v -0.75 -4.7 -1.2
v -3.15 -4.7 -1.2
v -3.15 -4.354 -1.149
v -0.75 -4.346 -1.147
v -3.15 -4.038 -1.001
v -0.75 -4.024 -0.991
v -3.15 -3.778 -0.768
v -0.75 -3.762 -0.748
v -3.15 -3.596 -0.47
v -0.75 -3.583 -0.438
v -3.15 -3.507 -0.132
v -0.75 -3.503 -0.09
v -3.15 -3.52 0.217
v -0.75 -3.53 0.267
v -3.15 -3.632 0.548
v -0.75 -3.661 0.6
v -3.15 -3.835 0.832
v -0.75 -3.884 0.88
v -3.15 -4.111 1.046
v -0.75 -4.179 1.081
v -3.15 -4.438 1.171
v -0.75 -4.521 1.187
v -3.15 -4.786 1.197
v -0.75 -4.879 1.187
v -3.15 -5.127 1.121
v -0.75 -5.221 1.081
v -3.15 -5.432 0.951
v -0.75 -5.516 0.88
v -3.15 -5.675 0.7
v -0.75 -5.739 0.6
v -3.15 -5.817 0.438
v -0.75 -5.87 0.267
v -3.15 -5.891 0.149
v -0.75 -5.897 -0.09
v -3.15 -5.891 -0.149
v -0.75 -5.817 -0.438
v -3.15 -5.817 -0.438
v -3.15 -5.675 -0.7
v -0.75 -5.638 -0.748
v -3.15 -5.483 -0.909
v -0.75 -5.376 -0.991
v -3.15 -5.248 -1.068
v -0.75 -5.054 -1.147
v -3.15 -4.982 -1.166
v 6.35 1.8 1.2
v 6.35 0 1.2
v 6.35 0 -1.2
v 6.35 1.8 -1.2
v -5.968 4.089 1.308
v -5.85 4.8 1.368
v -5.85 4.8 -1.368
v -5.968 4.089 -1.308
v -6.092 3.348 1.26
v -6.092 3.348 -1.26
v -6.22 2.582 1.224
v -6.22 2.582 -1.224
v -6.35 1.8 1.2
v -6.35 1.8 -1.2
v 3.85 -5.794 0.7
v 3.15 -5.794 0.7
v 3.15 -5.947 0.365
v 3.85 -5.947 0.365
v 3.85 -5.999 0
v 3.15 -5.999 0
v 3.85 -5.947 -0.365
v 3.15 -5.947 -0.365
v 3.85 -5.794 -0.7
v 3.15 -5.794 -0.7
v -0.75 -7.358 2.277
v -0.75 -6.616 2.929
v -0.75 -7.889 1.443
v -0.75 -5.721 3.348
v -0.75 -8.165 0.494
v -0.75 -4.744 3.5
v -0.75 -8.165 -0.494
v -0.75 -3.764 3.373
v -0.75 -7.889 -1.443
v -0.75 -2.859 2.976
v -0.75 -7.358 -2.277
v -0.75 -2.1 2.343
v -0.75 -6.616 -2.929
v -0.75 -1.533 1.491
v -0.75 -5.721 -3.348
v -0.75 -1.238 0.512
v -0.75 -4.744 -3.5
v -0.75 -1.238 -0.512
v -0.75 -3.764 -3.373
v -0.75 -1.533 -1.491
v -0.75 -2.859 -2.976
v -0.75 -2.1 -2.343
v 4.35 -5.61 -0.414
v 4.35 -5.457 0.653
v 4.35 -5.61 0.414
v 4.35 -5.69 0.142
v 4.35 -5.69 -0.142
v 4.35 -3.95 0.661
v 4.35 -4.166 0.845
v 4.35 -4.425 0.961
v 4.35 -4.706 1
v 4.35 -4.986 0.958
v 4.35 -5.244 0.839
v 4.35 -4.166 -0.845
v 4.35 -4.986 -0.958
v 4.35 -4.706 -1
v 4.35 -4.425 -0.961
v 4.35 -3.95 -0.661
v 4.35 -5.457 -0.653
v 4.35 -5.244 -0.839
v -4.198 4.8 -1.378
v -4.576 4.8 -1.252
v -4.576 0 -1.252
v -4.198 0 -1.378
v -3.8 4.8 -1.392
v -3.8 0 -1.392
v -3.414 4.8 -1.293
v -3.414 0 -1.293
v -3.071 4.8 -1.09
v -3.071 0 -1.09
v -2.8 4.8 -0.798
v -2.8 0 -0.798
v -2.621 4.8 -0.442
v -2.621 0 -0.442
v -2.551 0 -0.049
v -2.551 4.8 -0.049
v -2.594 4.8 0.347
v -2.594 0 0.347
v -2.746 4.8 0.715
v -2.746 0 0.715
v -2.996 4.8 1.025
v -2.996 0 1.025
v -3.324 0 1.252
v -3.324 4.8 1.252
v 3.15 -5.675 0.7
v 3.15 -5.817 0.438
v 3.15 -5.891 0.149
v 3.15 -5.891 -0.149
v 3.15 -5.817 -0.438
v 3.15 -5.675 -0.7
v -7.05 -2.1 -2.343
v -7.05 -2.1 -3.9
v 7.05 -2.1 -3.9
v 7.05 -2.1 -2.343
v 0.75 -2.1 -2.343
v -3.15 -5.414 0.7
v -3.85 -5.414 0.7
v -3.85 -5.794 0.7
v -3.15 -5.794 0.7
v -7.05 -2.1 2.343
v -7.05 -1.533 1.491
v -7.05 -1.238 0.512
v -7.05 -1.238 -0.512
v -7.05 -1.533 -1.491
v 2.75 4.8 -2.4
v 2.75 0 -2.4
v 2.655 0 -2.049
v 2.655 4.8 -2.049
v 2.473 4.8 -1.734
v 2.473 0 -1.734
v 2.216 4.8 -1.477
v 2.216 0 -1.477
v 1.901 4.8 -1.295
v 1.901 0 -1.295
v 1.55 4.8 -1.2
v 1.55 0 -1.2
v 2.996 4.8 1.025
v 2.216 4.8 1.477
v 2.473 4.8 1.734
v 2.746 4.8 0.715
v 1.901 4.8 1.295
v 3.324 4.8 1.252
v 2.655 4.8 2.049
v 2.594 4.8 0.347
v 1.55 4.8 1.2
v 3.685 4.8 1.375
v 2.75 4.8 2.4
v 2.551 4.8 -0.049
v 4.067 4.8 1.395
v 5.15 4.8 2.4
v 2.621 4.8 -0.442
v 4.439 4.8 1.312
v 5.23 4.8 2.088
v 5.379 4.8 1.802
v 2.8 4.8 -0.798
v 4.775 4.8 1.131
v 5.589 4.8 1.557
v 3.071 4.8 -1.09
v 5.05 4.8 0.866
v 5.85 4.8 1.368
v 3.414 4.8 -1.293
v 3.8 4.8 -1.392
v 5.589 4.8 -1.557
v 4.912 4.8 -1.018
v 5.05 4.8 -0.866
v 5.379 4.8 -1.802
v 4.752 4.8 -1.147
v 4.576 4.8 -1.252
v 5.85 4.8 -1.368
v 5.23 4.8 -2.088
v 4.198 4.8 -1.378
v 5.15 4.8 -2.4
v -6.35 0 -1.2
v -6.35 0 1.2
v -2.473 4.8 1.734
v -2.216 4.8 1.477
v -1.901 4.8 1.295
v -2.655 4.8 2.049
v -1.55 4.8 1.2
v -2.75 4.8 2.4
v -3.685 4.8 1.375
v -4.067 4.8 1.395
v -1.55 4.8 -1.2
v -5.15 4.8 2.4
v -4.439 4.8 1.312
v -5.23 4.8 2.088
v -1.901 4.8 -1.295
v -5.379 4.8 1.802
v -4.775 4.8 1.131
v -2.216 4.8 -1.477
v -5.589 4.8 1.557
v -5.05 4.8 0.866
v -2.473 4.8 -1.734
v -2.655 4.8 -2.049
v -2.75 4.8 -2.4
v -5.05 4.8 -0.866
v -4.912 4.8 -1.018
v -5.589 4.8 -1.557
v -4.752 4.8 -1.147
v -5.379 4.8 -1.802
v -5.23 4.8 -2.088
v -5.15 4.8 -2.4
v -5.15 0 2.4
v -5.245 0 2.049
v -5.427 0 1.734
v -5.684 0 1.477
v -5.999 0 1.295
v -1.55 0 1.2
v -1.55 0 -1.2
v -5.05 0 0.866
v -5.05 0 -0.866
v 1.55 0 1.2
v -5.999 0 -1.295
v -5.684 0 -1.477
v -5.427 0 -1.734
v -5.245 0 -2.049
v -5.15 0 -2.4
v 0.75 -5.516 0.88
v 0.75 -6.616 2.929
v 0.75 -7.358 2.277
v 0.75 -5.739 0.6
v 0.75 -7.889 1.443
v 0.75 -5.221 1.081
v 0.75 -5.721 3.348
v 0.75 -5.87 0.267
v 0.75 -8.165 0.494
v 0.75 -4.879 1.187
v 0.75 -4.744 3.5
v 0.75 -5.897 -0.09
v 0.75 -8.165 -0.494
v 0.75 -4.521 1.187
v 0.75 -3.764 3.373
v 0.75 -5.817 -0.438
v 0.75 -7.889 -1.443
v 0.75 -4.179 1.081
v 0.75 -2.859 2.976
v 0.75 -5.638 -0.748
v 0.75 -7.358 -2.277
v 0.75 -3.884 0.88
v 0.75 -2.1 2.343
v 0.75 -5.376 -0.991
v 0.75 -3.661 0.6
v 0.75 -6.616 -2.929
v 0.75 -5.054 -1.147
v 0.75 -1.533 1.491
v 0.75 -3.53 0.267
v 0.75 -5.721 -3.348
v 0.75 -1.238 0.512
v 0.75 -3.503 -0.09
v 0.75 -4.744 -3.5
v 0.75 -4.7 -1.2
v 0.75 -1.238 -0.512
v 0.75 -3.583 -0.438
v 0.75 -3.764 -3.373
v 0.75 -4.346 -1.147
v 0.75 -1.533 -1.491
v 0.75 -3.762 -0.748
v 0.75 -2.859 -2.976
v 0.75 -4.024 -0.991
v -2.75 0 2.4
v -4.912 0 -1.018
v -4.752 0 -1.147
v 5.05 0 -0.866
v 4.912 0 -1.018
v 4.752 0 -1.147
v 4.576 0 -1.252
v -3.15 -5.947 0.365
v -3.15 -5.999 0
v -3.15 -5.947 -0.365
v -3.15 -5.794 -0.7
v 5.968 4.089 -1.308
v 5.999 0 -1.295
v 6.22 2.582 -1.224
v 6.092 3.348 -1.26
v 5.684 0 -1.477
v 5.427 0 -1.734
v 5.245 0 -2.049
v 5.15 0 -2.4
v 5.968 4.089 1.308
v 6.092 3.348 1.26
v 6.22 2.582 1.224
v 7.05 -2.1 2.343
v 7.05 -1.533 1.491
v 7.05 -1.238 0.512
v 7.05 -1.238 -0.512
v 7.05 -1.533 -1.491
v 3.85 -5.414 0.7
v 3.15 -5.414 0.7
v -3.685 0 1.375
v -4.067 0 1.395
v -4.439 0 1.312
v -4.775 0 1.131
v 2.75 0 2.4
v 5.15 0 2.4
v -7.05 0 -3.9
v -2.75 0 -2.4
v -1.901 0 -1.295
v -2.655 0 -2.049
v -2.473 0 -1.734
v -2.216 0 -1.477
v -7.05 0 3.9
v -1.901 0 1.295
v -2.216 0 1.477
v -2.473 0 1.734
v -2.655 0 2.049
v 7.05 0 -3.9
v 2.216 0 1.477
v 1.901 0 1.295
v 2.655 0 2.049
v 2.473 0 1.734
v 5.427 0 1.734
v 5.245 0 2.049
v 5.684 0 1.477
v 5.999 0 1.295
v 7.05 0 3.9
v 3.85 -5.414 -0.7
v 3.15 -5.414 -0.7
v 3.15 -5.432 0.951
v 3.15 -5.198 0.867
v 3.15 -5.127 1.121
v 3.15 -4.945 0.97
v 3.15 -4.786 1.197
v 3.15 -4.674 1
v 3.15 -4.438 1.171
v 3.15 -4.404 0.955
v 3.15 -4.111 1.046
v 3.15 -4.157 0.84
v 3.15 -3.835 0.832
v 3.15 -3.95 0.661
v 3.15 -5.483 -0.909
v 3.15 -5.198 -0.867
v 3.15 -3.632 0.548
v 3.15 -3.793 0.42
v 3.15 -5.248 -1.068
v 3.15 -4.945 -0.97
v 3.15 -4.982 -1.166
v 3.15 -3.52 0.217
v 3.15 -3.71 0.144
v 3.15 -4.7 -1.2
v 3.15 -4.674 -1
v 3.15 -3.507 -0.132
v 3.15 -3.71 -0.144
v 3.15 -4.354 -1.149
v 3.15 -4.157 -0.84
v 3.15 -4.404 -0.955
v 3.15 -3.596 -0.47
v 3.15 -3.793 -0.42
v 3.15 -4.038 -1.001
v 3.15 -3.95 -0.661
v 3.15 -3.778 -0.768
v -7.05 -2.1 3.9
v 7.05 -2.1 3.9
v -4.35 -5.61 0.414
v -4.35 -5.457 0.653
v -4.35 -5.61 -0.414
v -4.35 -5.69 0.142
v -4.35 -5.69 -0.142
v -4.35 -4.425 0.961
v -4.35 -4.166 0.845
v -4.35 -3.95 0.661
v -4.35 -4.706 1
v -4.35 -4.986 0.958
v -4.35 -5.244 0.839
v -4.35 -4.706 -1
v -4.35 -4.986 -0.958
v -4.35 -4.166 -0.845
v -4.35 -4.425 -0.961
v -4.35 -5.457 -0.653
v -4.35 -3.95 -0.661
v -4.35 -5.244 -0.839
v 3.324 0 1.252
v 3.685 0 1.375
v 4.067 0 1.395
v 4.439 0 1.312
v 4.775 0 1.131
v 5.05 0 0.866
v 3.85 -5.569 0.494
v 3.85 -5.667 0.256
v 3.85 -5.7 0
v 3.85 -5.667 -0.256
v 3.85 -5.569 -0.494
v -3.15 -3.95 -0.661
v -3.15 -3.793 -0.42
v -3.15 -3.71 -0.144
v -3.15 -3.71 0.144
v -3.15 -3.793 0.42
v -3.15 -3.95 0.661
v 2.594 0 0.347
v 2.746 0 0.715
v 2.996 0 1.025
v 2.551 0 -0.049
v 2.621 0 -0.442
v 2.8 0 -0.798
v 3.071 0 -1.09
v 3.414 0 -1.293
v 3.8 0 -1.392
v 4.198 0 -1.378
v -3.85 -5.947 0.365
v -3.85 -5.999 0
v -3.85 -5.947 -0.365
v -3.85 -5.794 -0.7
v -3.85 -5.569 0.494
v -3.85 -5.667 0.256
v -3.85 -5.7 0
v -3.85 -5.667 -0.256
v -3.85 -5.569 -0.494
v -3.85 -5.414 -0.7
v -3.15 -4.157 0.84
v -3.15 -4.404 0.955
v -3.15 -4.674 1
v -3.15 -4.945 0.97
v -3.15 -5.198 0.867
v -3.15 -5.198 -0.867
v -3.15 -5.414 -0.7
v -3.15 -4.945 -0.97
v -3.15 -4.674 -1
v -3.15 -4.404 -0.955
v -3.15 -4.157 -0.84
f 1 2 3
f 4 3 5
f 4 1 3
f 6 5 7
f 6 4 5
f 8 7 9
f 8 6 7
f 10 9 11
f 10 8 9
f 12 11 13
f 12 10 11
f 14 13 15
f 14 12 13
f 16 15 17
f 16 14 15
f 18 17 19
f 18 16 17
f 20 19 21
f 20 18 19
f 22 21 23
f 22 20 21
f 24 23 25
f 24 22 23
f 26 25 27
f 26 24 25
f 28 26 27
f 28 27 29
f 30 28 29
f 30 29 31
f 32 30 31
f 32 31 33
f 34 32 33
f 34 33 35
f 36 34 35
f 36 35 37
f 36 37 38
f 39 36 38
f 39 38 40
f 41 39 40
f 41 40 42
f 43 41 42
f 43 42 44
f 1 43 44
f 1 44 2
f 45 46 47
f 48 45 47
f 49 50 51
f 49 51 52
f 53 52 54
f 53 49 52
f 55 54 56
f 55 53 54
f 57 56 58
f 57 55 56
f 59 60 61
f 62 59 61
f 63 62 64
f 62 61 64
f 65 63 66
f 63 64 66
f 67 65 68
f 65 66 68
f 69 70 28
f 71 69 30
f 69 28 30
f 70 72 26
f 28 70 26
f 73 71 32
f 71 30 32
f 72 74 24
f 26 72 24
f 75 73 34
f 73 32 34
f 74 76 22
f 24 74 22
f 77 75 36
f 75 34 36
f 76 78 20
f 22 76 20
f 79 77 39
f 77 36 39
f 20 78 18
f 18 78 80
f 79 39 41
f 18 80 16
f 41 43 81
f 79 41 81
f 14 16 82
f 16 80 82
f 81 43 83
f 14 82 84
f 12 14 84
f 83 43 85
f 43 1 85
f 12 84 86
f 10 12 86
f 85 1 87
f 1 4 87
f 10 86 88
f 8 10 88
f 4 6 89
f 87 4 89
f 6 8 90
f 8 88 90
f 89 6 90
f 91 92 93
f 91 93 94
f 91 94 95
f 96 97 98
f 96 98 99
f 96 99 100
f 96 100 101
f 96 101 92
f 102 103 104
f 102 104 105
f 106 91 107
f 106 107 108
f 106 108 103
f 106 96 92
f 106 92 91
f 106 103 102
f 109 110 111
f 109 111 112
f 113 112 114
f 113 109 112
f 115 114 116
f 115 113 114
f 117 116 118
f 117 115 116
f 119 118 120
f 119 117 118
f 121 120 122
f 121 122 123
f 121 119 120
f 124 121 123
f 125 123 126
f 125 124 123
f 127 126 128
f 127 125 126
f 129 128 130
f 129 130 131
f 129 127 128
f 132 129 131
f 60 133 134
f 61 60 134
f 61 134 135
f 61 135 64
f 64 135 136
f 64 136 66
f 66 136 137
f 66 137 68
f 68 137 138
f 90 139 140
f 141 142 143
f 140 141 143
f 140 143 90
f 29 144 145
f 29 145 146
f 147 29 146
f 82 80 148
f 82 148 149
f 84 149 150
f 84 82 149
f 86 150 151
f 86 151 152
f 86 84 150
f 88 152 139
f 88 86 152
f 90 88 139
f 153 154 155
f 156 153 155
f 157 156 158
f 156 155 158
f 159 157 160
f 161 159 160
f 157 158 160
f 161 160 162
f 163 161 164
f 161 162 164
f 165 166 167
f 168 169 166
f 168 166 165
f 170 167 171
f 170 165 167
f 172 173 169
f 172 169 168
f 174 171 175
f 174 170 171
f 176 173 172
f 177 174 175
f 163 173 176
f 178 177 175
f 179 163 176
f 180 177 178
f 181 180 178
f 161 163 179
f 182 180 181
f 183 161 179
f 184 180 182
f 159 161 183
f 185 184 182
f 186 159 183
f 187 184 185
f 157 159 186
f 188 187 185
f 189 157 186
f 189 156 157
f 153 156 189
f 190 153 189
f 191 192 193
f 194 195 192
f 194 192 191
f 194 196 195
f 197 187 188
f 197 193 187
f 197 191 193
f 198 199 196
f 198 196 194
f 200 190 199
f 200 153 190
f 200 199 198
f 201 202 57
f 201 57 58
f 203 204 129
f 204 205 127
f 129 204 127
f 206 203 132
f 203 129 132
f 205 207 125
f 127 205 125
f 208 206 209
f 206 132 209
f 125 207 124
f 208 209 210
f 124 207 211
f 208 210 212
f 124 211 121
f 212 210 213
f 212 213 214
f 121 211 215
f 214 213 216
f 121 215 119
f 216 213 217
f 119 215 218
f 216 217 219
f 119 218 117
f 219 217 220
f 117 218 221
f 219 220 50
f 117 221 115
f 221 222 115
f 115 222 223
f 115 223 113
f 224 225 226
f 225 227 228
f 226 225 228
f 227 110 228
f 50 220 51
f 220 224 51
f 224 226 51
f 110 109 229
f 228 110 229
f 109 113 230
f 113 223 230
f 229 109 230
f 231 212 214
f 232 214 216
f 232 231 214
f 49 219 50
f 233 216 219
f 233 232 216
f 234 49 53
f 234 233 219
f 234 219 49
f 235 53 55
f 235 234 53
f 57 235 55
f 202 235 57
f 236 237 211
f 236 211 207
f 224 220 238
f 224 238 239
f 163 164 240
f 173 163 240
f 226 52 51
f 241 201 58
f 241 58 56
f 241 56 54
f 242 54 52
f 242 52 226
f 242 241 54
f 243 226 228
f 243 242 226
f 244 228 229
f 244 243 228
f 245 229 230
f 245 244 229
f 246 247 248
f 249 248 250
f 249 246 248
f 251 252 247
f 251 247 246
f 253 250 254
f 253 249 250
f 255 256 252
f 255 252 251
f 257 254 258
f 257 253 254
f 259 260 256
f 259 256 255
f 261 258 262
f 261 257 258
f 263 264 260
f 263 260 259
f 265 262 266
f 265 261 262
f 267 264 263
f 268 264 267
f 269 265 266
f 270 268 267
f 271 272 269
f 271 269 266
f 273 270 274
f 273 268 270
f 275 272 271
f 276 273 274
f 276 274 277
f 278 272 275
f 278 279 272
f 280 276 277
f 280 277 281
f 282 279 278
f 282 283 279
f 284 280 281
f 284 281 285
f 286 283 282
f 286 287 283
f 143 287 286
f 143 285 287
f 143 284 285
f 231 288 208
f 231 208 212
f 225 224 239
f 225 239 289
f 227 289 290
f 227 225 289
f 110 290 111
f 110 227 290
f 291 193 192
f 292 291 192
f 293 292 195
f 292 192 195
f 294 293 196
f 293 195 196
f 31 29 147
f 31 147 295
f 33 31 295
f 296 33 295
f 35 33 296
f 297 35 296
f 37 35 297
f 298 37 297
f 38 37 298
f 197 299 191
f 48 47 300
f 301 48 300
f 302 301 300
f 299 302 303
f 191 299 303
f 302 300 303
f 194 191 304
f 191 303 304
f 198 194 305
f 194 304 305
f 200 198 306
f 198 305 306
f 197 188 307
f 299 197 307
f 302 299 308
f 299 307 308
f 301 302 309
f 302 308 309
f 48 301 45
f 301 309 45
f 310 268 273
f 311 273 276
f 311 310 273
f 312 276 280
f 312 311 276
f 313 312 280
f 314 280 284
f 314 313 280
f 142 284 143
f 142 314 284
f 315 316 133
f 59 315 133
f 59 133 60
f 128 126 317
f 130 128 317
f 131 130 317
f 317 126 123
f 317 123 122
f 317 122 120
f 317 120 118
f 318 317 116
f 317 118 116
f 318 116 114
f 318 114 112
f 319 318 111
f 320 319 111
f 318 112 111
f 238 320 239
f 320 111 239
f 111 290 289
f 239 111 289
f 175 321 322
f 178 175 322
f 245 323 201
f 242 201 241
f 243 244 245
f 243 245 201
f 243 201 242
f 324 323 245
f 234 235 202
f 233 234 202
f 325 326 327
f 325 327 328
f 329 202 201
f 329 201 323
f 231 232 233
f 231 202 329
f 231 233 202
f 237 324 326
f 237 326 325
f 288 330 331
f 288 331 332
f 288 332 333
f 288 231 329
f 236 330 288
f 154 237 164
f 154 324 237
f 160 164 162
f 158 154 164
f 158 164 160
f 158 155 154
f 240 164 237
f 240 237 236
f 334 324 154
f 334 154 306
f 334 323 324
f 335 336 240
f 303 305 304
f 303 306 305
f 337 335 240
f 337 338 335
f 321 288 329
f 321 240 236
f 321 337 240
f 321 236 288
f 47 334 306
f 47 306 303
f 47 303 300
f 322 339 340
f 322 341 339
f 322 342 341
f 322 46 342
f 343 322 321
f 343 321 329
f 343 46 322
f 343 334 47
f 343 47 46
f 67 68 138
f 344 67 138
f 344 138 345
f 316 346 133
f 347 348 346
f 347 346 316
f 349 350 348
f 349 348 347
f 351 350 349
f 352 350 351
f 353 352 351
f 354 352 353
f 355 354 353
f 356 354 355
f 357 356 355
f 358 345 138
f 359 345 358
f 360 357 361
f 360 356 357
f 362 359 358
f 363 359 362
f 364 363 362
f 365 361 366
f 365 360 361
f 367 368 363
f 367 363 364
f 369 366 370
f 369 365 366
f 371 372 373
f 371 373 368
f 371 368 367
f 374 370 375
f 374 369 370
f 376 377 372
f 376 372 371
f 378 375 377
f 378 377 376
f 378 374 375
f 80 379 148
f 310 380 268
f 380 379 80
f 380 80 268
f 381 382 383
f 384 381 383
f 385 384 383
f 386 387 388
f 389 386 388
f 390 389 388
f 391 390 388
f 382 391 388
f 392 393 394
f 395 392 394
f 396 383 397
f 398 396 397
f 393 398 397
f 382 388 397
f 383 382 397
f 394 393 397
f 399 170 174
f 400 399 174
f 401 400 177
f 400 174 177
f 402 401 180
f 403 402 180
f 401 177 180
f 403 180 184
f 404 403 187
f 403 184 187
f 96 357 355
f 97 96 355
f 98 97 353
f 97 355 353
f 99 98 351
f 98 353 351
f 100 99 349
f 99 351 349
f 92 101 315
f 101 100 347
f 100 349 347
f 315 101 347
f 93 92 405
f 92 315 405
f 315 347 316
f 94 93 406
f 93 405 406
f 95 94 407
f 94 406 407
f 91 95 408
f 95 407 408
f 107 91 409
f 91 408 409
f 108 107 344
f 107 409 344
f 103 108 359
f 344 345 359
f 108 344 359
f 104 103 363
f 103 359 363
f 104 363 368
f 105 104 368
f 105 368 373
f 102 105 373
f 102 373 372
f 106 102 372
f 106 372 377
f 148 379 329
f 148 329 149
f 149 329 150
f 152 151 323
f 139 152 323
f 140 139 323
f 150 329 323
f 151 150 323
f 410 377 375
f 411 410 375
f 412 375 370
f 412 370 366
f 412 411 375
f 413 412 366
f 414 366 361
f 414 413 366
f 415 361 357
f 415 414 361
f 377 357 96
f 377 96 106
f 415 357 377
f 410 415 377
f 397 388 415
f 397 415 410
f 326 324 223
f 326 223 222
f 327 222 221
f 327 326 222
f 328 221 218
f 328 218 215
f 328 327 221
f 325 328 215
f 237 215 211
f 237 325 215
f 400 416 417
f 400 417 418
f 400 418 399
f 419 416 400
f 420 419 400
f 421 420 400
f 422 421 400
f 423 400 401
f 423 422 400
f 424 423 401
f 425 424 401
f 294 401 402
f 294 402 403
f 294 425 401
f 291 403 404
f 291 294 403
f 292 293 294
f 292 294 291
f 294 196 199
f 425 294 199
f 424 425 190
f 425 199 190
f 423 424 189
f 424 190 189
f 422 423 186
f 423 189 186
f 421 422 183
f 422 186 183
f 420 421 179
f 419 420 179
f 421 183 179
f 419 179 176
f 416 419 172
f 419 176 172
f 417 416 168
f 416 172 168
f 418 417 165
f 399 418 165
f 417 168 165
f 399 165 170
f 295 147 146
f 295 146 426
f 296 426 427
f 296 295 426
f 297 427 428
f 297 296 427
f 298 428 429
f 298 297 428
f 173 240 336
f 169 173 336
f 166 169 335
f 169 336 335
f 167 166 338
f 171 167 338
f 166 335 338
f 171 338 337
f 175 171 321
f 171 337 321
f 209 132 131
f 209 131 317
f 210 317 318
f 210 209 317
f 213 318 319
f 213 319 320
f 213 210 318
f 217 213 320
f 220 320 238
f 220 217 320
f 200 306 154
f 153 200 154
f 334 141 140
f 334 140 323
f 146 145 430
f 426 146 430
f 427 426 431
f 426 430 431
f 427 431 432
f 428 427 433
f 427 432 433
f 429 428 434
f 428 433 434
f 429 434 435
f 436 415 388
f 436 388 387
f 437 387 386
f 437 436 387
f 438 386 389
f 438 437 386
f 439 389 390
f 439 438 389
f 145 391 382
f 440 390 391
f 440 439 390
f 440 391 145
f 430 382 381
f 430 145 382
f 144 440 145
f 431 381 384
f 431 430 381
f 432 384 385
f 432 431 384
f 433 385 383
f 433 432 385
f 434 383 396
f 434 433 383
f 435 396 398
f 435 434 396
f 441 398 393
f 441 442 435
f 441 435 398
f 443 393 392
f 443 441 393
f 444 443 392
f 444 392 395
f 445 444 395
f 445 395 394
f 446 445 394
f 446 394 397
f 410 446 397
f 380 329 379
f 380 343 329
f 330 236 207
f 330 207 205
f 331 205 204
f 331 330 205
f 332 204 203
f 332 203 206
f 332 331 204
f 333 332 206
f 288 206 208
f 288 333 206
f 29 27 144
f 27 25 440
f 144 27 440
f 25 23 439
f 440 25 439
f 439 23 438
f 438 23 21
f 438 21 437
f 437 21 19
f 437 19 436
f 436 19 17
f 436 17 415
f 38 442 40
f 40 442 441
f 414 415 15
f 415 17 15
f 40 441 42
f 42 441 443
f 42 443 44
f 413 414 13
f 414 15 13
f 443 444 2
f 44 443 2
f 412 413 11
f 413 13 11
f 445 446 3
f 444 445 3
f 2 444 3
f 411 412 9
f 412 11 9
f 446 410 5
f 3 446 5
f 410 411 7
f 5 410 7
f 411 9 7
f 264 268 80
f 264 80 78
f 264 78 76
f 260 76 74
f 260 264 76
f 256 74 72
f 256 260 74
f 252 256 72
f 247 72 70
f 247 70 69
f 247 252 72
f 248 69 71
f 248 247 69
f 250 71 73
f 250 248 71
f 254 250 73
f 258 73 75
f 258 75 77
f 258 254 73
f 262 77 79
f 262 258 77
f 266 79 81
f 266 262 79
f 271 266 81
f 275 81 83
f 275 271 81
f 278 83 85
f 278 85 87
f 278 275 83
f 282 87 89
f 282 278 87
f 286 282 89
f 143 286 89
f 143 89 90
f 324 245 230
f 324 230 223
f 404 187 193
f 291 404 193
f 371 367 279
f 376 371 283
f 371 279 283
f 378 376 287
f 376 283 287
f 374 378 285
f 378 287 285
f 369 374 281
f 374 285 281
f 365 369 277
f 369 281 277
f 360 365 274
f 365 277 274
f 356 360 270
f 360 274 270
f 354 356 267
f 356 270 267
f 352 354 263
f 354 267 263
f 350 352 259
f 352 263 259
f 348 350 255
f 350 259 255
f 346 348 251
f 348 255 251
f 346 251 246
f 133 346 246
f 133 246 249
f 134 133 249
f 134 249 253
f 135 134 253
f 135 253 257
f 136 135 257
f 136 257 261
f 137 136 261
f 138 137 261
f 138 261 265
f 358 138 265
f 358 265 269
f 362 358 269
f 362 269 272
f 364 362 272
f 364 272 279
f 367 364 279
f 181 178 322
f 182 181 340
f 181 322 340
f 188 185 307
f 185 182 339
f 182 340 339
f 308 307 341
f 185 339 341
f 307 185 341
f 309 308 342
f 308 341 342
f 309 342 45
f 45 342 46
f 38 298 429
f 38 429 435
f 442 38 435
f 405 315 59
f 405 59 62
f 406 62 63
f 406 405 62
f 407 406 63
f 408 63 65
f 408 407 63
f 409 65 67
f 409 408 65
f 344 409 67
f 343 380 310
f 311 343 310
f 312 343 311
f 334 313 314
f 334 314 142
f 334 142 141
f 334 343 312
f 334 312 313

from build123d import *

# Parameters (mm, degrees)
SALIENTE_EXTRUIR1_DEPTH = 7.05
SALIENTE_EXTRUIR2_DEPTH = 0.75
CROQUIS2_R              = 1.2
SALIENTE_EXTRUIR3_DEPTH = 2.4
CROQUIS3_R              = 1
SALIENTE_EXTRUIR4_DEPTH = 1.2
CORTAR_EXTRUIR1_REACH   = 16.574
SALIENTE_EXTRUIR5_DEPTH = 0.7
SALIENTE_EXTRUIR6_DEPTH = 4.8
CORTAR_EXTRUIR2_DEPTH   = 4.8
CORTAR_EXTRUIR4_DEPTH   = 4.8


with BuildPart() as part:
    # Croquis1 → Saliente-Extruir1 (new, symmetric)
    with BuildSketch(Plane(origin=(0, 0, 0), x_dir=(0, 0, -1), z_dir=(1, 0, 0))):
        with BuildLine():
            ThreePointArc((-2.343074903, -2.1), (0, -1.2), (2.343074903, -2.1))
            Line((2.343074903, -2.1), (3.9, -2.1))
            Line((3.9, -2.1), (3.9, 0))
            Line((3.9, 0), (-3.9, 0))
            Line((-3.9, 0), (-3.9, -2.1))
            Line((-3.9, -2.1), (-2.343074903, -2.1))
        make_face()
    extrude(amount=SALIENTE_EXTRUIR1_DEPTH, both=True)

    # Croquis1<3> → Saliente-Extruir2 (add, symmetric)
    with BuildSketch(Plane(origin=(0, 0, 0), x_dir=(0, 0, -1), z_dir=(1, 0, 0))):
        with BuildLine():
            ThreePointArc((3.5, -4.7), (3.197714978, -3.277108957), (2.343074903, -2.1))
            ThreePointArc((2.343074903, -2.1), (0, -1.2), (-2.343074903, -2.1))
            ThreePointArc((-2.343074903, -2.1), (-1.422891043, -7.897714978), (3.5, -4.7))
        make_face()
    extrude(amount=SALIENTE_EXTRUIR2_DEPTH, both=True)

    # Croquis2 → Saliente-Extruir3 (add)
    with BuildSketch(Plane(origin=(0.75, 0, 0), x_dir=(0, 0, -1), z_dir=(1, 0, 0))):
        with Locations((0, -4.7)):
            Circle(CROQUIS2_R)
    saliente_extruir3 = extrude(amount=SALIENTE_EXTRUIR3_DEPTH)

    # Croquis3 → Saliente-Extruir4 (add)
    with BuildSketch(Plane(origin=(3.15, 0, 0), x_dir=(0, 0, -1), z_dir=(1, 0, 0))):
        with Locations((0, -4.7)):
            Circle(CROQUIS3_R)
    saliente_extruir4 = extrude(amount=SALIENTE_EXTRUIR4_DEPTH)

    # Croquis4 → Cortar-Extruir1 (cut, up to next)
    with BuildSketch(Plane(origin=(4.35, 0, 0), x_dir=(0, 0, -1), z_dir=(1, 0, 0)), mode=Mode.PRIVATE) as cortar_extruir1_sk1:
        with BuildLine():
            Line((-0.661437828, -3.95), (0.661437828, -3.95))
            ThreePointArc((0.661437828, -3.95), (0, -3.7), (-0.661437828, -3.95))
        make_face()
    cortar_extruir1_tool1 = extrude(cortar_extruir1_sk1.sketch, amount=-CORTAR_EXTRUIR1_REACH, mode=Mode.PRIVATE) & part.part
    cortar_extruir1 = cortar_extruir1_tool1.solids().sort_by_distance((4.35, -3.848845, 0))[0]
    add(cortar_extruir1, mode=Mode.SUBTRACT)

    # Croquis5 → Saliente-Extruir5 (add)
    with BuildSketch(Plane(origin=(3.15, 0, 0), x_dir=(0, 0, -1), z_dir=(1, 0, 0))):
        with BuildLine():
            ThreePointArc((0.7, -5.414142843), (0, -5.7), (-0.7, -5.414142843))
            Line((-0.7, -5.414142843), (-0.7, -5.794142843))
            ThreePointArc((-0.7, -5.794142843), (0, -5.99890283), (0.7, -5.794142843))
            Line((0.7, -5.794142843), (0.7, -5.414142843))
        make_face()
    saliente_extruir5 = extrude(amount=SALIENTE_EXTRUIR5_DEPTH)

    # Croquis6 → Saliente-Extruir6 (add)
    with BuildSketch(Plane(origin=(0, 0, 0), x_dir=(1, 0, 0), z_dir=(0, 1, 0))):
        with BuildLine():
            Line((2.75, -2.4), (5.15, -2.4))
            ThreePointArc((5.15, -2.4), (5.547451294, -1.597451294), (6.35, -1.2))
            Line((6.35, -1.2), (6.35, 1.2))
            ThreePointArc((6.35, 1.2), (5.547451294, 1.597451294), (5.15, 2.4))
            Line((5.15, 2.4), (2.75, 2.4))
            ThreePointArc((2.75, 2.4), (2.352548706, 1.597451294), (1.55, 1.2))
            Line((1.55, 1.2), (1.55, -1.2))
            ThreePointArc((1.55, -1.2), (2.352548706, -1.597451294), (2.75, -2.4))
        make_face()
    saliente_extruir6 = extrude(amount=SALIENTE_EXTRUIR6_DEPTH)

    # Croquis7 → Cortar-Extruir2 (cut)
    with BuildSketch(Plane(origin=(0, 4.8, 0), x_dir=(1, 0, 0), z_dir=(0, 1, 0))):
        with BuildLine():
            ThreePointArc((5.05, 0.866025404), (2.55, 0), (5.05, -0.866025404))
            Line((5.05, -0.866025404), (5.05, 0.866025404))
        make_face()
    cortar_extruir2 = extrude(amount=-CORTAR_EXTRUIR2_DEPTH, mode=Mode.SUBTRACT)

    # Croquis8 → Cortar-Extruir4 (cut)
    with BuildSketch(Plane.XY.offset(2.4)):
        Polygon((5.85, 4.8), (6.35, 1.8), (6.35, 4.8), align=None)
    cortar_extruir4 = extrude(amount=-CORTAR_EXTRUIR4_DEPTH, mode=Mode.SUBTRACT)

    # Simetría1: Saliente-Extruir3, Saliente-Extruir4, Cortar-Extruir1, Saliente-Extruir5, Saliente-Extruir6, Cortar-Extruir2, Cortar-Extruir4 across plane
    add(saliente_extruir3.mirror(Plane(origin=(0, 0, 0), x_dir=(0, 0, 1), z_dir=(1, 0, 0))))
    add(saliente_extruir4.mirror(Plane(origin=(0, 0, 0), x_dir=(0, 0, 1), z_dir=(1, 0, 0))))
    add(cortar_extruir1.mirror(Plane(origin=(0, 0, 0), x_dir=(0, 0, 1), z_dir=(1, 0, 0))), mode=Mode.SUBTRACT)
    add(saliente_extruir5.mirror(Plane(origin=(0, 0, 0), x_dir=(0, 0, 1), z_dir=(1, 0, 0))))
    add(saliente_extruir6.mirror(Plane(origin=(0, 0, 0), x_dir=(0, 0, 1), z_dir=(1, 0, 0))))
    add(cortar_extruir2.mirror(Plane(origin=(0, 0, 0), x_dir=(0, 0, 1), z_dir=(1, 0, 0))), mode=Mode.SUBTRACT)
    add(cortar_extruir4.mirror(Plane(origin=(0, 0, 0), x_dir=(0, 0, 1), z_dir=(1, 0, 0))), mode=Mode.SUBTRACT)


solid = part.part
